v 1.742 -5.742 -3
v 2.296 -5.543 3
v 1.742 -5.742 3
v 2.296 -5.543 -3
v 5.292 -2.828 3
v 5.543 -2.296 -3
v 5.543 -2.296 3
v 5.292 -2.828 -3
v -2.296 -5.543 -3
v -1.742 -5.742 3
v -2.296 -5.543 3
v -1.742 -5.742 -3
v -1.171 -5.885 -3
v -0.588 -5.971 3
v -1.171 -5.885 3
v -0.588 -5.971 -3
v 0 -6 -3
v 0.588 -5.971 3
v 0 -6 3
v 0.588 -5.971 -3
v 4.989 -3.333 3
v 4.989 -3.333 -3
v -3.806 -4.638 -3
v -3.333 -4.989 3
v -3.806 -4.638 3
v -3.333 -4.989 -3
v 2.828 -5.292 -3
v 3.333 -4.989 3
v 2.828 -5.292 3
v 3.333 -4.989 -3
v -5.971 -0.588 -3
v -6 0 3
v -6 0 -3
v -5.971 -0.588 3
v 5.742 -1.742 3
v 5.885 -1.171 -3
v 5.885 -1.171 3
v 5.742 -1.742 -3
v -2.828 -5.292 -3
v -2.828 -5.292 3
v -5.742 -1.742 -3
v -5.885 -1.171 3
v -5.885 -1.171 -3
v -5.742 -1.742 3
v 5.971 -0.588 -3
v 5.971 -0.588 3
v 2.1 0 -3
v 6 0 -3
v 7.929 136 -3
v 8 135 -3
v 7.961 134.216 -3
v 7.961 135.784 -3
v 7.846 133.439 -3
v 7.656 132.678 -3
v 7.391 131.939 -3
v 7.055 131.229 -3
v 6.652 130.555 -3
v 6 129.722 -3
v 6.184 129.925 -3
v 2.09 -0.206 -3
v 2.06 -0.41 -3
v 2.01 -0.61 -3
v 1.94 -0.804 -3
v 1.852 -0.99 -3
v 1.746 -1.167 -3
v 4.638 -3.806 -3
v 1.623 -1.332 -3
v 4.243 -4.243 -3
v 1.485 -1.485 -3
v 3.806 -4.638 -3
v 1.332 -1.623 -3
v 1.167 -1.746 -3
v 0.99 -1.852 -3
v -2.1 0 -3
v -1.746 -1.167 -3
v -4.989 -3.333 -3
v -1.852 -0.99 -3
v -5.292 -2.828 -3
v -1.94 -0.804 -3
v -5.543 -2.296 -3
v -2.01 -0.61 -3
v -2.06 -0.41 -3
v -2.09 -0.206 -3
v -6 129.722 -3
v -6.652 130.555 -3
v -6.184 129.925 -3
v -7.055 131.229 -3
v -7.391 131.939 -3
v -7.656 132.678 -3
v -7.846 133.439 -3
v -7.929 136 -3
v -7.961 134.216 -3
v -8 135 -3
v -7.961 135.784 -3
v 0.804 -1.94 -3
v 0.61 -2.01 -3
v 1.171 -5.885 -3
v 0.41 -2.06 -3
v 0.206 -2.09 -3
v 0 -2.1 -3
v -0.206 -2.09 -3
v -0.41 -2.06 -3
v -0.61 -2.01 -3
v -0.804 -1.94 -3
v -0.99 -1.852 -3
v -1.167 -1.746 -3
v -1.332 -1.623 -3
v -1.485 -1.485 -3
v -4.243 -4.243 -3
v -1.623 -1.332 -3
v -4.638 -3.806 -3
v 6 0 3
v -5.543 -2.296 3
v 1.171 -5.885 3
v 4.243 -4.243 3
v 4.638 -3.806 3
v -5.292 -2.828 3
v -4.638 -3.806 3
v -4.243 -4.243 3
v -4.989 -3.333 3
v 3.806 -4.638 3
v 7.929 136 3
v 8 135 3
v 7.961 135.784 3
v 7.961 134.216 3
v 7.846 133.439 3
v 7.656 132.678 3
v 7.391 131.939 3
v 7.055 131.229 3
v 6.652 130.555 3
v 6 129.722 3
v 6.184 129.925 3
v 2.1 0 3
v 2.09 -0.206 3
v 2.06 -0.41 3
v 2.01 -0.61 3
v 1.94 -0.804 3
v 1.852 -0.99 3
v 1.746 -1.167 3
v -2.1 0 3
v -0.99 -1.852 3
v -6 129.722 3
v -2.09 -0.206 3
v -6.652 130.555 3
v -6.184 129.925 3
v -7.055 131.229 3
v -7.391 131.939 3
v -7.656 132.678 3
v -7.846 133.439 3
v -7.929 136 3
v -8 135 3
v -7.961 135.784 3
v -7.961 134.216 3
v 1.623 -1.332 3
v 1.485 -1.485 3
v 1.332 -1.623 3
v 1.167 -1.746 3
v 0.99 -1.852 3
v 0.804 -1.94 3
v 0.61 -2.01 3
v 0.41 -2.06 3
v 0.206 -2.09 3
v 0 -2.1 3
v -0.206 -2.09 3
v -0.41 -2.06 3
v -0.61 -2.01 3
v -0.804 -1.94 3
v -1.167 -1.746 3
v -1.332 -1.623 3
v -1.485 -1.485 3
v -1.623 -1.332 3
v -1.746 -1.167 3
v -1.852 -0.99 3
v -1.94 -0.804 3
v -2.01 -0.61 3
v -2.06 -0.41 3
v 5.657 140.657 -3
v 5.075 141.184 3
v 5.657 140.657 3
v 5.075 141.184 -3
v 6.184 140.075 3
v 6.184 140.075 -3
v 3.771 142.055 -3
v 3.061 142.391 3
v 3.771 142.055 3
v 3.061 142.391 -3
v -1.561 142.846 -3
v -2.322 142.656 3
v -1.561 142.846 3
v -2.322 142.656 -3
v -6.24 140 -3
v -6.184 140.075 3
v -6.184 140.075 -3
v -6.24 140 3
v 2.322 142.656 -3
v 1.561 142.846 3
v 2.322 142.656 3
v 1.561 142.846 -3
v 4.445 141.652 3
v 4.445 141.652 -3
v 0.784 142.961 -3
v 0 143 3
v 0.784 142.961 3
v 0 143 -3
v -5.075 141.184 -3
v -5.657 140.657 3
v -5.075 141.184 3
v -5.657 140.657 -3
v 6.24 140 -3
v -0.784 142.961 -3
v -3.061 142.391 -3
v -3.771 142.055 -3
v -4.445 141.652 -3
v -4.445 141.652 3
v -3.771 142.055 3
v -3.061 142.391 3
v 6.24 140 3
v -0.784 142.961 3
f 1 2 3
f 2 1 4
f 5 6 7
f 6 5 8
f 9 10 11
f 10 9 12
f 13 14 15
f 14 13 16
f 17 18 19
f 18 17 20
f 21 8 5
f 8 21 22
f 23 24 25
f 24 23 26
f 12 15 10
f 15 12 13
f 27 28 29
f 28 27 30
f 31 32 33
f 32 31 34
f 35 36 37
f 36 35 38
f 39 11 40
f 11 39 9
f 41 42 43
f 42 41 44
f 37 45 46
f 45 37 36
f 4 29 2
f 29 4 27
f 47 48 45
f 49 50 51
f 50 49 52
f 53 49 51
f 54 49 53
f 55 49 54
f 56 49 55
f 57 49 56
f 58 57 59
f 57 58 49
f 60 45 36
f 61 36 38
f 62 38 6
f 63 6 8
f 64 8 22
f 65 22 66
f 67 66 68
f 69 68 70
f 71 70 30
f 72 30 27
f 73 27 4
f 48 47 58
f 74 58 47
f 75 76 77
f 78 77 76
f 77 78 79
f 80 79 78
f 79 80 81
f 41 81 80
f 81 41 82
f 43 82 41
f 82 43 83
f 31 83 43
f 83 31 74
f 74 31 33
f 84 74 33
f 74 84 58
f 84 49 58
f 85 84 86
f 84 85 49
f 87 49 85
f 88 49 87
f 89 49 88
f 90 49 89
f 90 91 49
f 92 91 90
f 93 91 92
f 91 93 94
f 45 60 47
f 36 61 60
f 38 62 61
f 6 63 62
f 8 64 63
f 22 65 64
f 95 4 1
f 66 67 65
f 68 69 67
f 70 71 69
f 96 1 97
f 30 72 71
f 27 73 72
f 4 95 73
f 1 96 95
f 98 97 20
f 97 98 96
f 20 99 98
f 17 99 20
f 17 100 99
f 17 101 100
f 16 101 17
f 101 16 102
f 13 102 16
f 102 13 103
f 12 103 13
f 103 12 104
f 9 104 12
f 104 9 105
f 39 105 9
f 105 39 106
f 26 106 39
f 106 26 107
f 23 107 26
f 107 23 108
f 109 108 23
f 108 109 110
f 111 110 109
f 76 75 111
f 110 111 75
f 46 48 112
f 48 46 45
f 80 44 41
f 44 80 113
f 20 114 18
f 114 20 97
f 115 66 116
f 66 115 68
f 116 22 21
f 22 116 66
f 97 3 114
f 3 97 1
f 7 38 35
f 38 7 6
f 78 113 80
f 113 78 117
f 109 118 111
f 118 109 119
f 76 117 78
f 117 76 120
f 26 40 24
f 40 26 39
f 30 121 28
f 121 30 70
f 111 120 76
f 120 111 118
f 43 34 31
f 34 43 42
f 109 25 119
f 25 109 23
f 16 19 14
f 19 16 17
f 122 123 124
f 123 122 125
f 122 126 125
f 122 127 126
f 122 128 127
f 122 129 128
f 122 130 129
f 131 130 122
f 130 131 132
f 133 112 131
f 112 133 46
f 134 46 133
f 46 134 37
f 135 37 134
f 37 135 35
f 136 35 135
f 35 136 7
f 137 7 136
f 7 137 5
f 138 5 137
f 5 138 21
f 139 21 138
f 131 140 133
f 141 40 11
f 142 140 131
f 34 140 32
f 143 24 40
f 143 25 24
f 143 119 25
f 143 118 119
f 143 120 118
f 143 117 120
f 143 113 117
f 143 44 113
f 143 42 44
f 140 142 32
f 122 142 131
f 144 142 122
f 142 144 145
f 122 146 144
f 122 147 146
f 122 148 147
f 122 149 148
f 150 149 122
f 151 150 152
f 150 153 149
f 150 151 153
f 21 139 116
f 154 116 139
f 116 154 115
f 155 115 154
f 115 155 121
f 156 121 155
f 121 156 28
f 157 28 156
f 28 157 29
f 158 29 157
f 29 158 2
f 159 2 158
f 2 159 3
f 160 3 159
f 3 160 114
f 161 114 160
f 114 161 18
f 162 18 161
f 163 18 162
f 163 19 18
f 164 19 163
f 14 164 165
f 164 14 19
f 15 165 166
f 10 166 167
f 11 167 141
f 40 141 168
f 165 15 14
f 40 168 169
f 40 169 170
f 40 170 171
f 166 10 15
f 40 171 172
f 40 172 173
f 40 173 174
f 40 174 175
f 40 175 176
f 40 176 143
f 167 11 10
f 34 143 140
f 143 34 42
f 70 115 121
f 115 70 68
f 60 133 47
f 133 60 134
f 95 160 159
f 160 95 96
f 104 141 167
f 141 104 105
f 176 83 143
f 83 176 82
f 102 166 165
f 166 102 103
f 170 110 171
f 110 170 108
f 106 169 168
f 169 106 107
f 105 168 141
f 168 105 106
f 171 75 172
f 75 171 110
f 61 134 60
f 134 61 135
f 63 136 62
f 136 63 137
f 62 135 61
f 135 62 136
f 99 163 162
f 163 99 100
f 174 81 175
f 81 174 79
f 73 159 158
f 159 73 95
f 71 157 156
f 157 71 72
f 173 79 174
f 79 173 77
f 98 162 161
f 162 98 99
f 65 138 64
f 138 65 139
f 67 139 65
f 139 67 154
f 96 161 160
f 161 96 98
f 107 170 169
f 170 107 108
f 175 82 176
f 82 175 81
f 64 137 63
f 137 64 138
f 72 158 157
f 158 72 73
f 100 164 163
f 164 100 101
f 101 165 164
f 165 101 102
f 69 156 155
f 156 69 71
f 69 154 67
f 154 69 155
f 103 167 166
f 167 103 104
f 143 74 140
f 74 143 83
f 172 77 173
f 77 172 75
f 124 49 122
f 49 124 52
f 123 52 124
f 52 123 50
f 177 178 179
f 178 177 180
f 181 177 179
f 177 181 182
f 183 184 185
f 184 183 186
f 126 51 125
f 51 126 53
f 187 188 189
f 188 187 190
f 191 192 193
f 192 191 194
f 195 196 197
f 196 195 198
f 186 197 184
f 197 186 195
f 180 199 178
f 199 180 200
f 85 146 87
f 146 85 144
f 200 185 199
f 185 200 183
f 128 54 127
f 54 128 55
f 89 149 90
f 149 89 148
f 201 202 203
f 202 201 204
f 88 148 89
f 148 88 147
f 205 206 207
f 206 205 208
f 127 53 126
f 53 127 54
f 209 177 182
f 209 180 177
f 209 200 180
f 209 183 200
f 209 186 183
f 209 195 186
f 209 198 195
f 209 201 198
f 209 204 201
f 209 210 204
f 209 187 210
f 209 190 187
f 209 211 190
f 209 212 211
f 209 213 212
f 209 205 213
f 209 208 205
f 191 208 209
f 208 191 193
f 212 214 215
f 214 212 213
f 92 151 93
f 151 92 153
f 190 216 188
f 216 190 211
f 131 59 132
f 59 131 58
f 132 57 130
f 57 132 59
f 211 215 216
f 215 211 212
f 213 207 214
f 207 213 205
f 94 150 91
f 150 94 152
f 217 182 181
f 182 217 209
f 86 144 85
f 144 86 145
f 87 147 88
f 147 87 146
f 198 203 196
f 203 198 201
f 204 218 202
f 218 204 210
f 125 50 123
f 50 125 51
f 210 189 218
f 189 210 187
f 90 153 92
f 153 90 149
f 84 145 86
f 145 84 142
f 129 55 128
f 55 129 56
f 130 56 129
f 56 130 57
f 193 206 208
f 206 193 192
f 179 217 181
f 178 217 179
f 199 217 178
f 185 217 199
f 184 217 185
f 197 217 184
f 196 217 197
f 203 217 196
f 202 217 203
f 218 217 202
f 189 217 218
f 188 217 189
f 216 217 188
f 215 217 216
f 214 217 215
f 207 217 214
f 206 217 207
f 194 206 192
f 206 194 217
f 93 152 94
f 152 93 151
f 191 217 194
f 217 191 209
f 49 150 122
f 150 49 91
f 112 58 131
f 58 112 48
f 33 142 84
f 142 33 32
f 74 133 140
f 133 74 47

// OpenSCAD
// file: ../modules/hinge.scad
// ====================================================================
// Integrated 3D Printable Hinge Module
// Pin-and-barrel knuckle hinge for French doors and top roof doors
// ====================================================================
include <../config.scad>

// Female Hinge Knuckle (mounted to frame pillar)
module hinge_female_knuckle(
    barrel_od = 10.0,
    pin_id = 5.0,
    height = 28.0,
    center_gap = 12.0
) {
    difference() {
        cylinder(d = barrel_od, h = height, center = true);
        
        // Center cutout for male knuckle
        cube([barrel_od + 2, barrel_od + 2, center_gap + 2*TOL_HINGE], center = true);
        
        // Through-hole for hinge pin
        cylinder(d = pin_id + TOL_HINGE, h = height + 4, center = true);
    }
}

// Male Hinge Knuckle (mounted to door frame)
module hinge_male_knuckle(
    barrel_od = 10.0,
    pin_id = 5.0,
    knuckle_h = 11.5
) {
    difference() {
        cylinder(d = barrel_od - 0.2, h = knuckle_h, center = true);
        
        // Through-hole for hinge pin
        cylinder(d = pin_id + TOL_HINGE, h = knuckle_h + 2, center = true);
    }
}

// Dedicated 3D Printable Hinge Pin with Retention Head
module hinge_pin(
    pin_id = 5.0,
    length = 32.0
) {
    union() {
        // Main pin shaft
        cylinder(d = pin_id - TOL_HINGE, h = length, center = true);
        
        // Chamfered tip for easy alignment insertion
        translate([0, 0, length/2])
        cylinder(r1 = (pin_id - TOL_HINGE)/2, r2 = (pin_id - TOL_HINGE)/2 - 0.8, h = 2, center = false);
        
        // Retention cap
        translate([0, 0, -length/2 - 2])
        cylinder(d = pin_id + 4, h = 2.5, center = false);
    }
}
// file: ../modules/spline_profile.scad
// ====================================================================
// Cellophane Spline Groove & Snap-in Locking Strip Module
// Retention mechanism to hold packaging plastic taut without screws
// ====================================================================
include <../config.scad>

// Negative volume for cutting the spline groove into any beam surface
// Oriented along X axis, cut into -Z face
module spline_groove_negative(length = 100) {
    translate([0, 0, -GROOVE_DEPTH / 2])
    union() {
        // Main channel
        cube([length, GROOVE_WIDTH, GROOVE_DEPTH], center = true);
        
        // Retention undercuts / wedge lip at depth
        translate([0, 0, -GROOVE_DEPTH / 4])
        cube([length, GROOVE_WIDTH + 0.6, GROOVE_DEPTH / 2], center = true);
    }
}

// 2D Profile of the snap-in locking spline clip
module spline_clip_profile_2d() {
    w = SPLINE_WIDTH;
    h = SPLINE_HEIGHT;
    union() {
        // Chamfered lead-in nose
        polygon(points=[
            [-w/2 + 0.8, 0],
            [ w/2 - 0.8, 0],
            [ w/2, 1.0],
            [ w/2, h - 1.0],
            [ w/2 + 0.5, h], // Outer retention lip
            [-w/2 - 0.5, h], // Outer retention lip
            [-w/2, h - 1.0],
            [-w/2, 1.0]
        ]);
        
        // Gripping top ridge for thumb pressing and removal
        translate([0, h + 1.0])
        circle(r = 1.6);
    }
}

// 3D Snap-in Locking Spline Clip (cut to specified length)
module spline_clip(length = 150) {
    rotate([0, 90, 0])
    linear_extrude(height = length, center = true) {
        spline_clip_profile_2d();
    }
}
// file: ../modules/dovetail.scad
// ====================================================================
// Dovetail Interlock & Tapered Locking Pin Module
// Hardware-free rigid joint system for modular 3D printed beams
// ====================================================================
include <../config.scad>

// 2D Profile of Tapered Dovetail (centered at origin, extending in +Y direction)
module dovetail_profile_2d(base_w, tip_w, depth, offset_val=0) {
    w1 = (base_w / 2) + offset_val;
    w2 = (tip_w / 2) + offset_val;
    polygon(points=[
        [-w2, 0],
        [-w1, depth],
        [ w1, depth],
        [ w2, 0]
    ]);
}

// 3D Male Dovetail Tenon (extruded along Z, projects in +X or +Z depending on usage)
module male_dovetail(
    w = BEAM_WIDTH,
    h = BEAM_HEIGHT,
    depth = DOVETAIL_DEPTH,
    tol = 0
) {
    difference() {
        translate([0, -depth, 0])
        rotate([0, 0, 90])
        linear_extrude(height = h - 2*tol, center = true) {
            dovetail_profile_2d(
                base_w = DOVETAIL_BASE_W - 2*tol,
                tip_w  = DOVETAIL_TIP_W  - 2*tol,
                depth  = depth
            );
        }
        
        // Transverse locking pin hole (tapered)
        translate([0, -depth/2, 0])
        rotate([90, 0, 0])
        cylinder(
            r1 = (PIN_HOLE_DIA / 2) - 0.2,
            r2 = (PIN_HOLE_DIA / 2) + 0.2,
            h  = w + 10,
            center = true
        );
    }
}

// 3D Female Dovetail Pocket (cut into beam end)
module female_dovetail_pocket(
    w = BEAM_WIDTH,
    h = BEAM_HEIGHT,
    depth = DOVETAIL_DEPTH,
    tol = TOL_DOVETAIL
) {
    union() {
        translate([0, -0.01, 0])
        rotate([0, 0, 90])
        linear_extrude(height = h + 2*tol, center = true) {
            dovetail_profile_2d(
                base_w = DOVETAIL_BASE_W + 2*tol,
                tip_w  = DOVETAIL_TIP_W  + 2*tol,
                depth  = depth + 0.5
            );
        }
        
        // Transverse locking pin hole through the surrounding walls
        translate([0, depth/2, 0])
        rotate([90, 0, 0])
        cylinder(
            r1 = (PIN_HOLE_DIA / 2) - 0.2,
            r2 = (PIN_HOLE_DIA / 2) + 0.2,
            h  = w + 10,
            center = true
        );
    }
}

// Tapered Locking Wedge Pin
module locking_taper_pin(
    pin_len = BEAM_WIDTH + 6,
    dia = PIN_HOLE_DIA,
    taper = PIN_TAPER_ANGLE
) {
    r_mid = dia / 2 - TOL_DOVETAIL;
    delta_r = (pin_len / 2) * tan(taper / 2);
    r1 = r_mid - delta_r;
    r2 = r_mid + delta_r;
    
    union() {
        // Tapered locking shaft
        cylinder(r1 = r1, r2 = r2, h = pin_len, center = true);
        
        // Ergonomic pull-tab head for tool-free insertion & removal
        translate([0, 0, pin_len / 2])
        hull() {
            cylinder(r = r2 + 2.5, h = 3.5, center = false);
            translate([0, 0, 5])
            cube([2.5, (r2 + 2.5)*2, 0.1], center = true);
        }
    }
}
// file: ../config.scad
// ====================================================================
// Bambu Lab A1 Enclosure - Global Configuration Parameters
// 100% 3D Printable, Hardware-Free Modular Enclosure
// ====================================================================

// --- Print Bed Limits ---
MAX_PRINT_X = 256;
MAX_PRINT_Y = 256;
MAX_PRINT_Z = 256;
SAFE_PART_MAX_LEN = 240; // Safety margin for brim and skirt

// --- Internal Enclosure Dimensions (mm) ---
// Sized for Bambu Lab A1 bed-slinger travel, right poop bucket, and top BMCU 370c
INTERNAL_WIDTH  = 560; // X axis clearance (A1 + toolhead + right poop bucket)
INTERNAL_DEPTH  = 580; // Y axis clearance (Bed travel + rear cable loop buffer)
INTERNAL_HEIGHT = 710; // Z axis clearance (Gantry + BMCU 370c rotating mount + spool)

// --- Frame Profile Dimensions ---
BEAM_WIDTH  = 24;  // Beam thickness X/Y (mm)
BEAM_HEIGHT = 24;  // Beam thickness Z (mm)
WALL_THICKNESS = 3.2; // Shell thickness for robust frame rigidity

// Outer Dimensions
OUTER_WIDTH  = INTERNAL_WIDTH  + 2 * BEAM_WIDTH;  // ~608 mm
OUTER_DEPTH  = INTERNAL_DEPTH  + 2 * BEAM_WIDTH;  // ~628 mm
OUTER_HEIGHT = INTERNAL_HEIGHT + 2 * BEAM_HEIGHT; // ~758 mm

// --- Tolerances (FDM 3D Printing tuned for Bambu Lab A1 0.4mm nozzle) ---
TOL_TIGHT    = 0.15; // Tight press fit (spline clips)
TOL_DOVETAIL = 0.20; // Sliding interlock fit (dovetails & taper pins)
TOL_HINGE    = 0.30; // Free rotating hinge pins
TOL_LOOSE    = 0.40; // Clearance gaps

// --- Cellophane Spline Groove Specifications ---
GROOVE_WIDTH  = 4.5; // Width of U-channel on outer beam faces
GROOVE_DEPTH  = 5.0; // Depth of U-channel
SPLINE_WIDTH  = 4.2; // Width of snap-in locking spline strip
SPLINE_HEIGHT = 4.8; // Height of locking spline strip
SPLINE_LIP_R  = 0.6; // Small retention bead radius to pinch cellophane

// --- Tapered Dovetail & Pin Specifications ---
DOVETAIL_DEPTH  = 16.0; // Length of dovetail insert (mm)
DOVETAIL_BASE_W = 14.0; // Width at base of male dovetail
DOVETAIL_TIP_W  = 8.0;  // Width at narrowest point of taper
PIN_HOLE_DIA    = 6.0;  // Transverse locking pin hole diameter (tapered)
PIN_TAPER_ANGLE = 4.0;  // Degrees taper on locking pin for wedge action

// --- Segmentation Calculations (All segments < SAFE_PART_MAX_LEN) ---
CORNER_BLOCK_SIZE = 36; // 3-way cubic corner junction dimension

// Beam span between corners:
SPAN_X = INTERNAL_WIDTH  + 2 * BEAM_WIDTH - 2 * CORNER_BLOCK_SIZE;  // 608 - 72 = 536 mm
SPAN_Y = INTERNAL_DEPTH  + 2 * BEAM_WIDTH - 2 * CORNER_BLOCK_SIZE;  // 628 - 72 = 556 mm
SPAN_Z = INTERNAL_HEIGHT + 2 * BEAM_HEIGHT - 2 * CORNER_BLOCK_SIZE; // 758 - 72 = 686 mm

// Number of segments per span:
NUM_SEGS_X = 3; // 536 / 3 = 178.67 mm per segment
NUM_SEGS_Y = 3; // 556 / 3 = 185.33 mm per segment
NUM_SEGS_Z = 3; // 686 / 3 = 228.67 mm per segment

SEG_LEN_X = SPAN_X / NUM_SEGS_X;
SEG_LEN_Y = SPAN_Y / NUM_SEGS_Y;
SEG_LEN_Z = SPAN_Z / NUM_SEGS_Z;

// --- Filament PTFE Tube Routing (Bottom Side Beam) ---
PTFE_TUBE_OD  = 4.0; // Standard PTFE bowden tube outer diameter (mm)
PTFE_HOLE_DIA = 4.3; // Slip-fit through-hole diameter with retention grip
PTFE_TUBE_CNT = 4;   // 4 dedicated filament tubes for multi-material / drybox
PTFE_ANGLE    = 35;  // Upward angle toward toolhead/BMCU (degrees)

// --- Render Quality ($fn) ---
$fn = $preview ? 24 : 64;
// main file
// ====================================================================
// Dual Top Roof Doors with Integrated Heat Dissipation Prop Legs
// Opens upward to vent heat during PLA/PETG printing or close for draft protection
// Fully modular and printable on Bambu Lab A1
// ====================================================================
include <../config.scad>
use <../modules/dovetail.scad>
use <../modules/spline_profile.scad>
use <../modules/hinge.scad>

ROOF_DOOR_WIDTH = (INTERNAL_WIDTH / 2) - 4.0; // ~276 mm per door leaf
ROOF_DOOR_DEPTH = INTERNAL_DEPTH - 6.0;        // ~574 mm total depth
ROOF_FRAME_W = 16.0;
ROOF_FRAME_H = 16.0;

// 1. Roof Door Depth Stile Segment (Hinged to the top side frame beam)
// Depth split into 3 segments (~190 mm each)
module roof_stile_segment(length = ROOF_DOOR_DEPTH / 3, is_hinge = false) {
    difference() {
        union() {
            cube([ROOF_FRAME_W, length, ROOF_FRAME_H], center = true);
            
            // Integrated Male Hinge Knuckle on outer edge
            if (is_hinge) {
                translate([-ROOF_FRAME_W/2 - 4.5, 0, 0])
                rotate([90, 0, 0])
                hinge_male_knuckle();
            }
        }
        
        // Spline groove for top cellophane panel facing inward (+X)
        translate([ROOF_FRAME_W/2, 0, 0])
        rotate([90, 0, 0])
        spline_groove_negative(length = length + 2);
        
        // Female joint at -Y end
        translate([0, -length/2, 0])
        rotate([0, 0, 90])
        female_dovetail_pocket(w = ROOF_FRAME_W, h = ROOF_FRAME_H, depth = 12);
    }
    
    // Male joint at +Y end
    translate([0, length/2, 0])
    rotate([0, 0, -90])
    male_dovetail(w = ROOF_FRAME_W, h = ROOF_FRAME_H, depth = 12);
}

// 2. Center Meeting Stile Segment with Prop-Leg Pivot & Detent Socket
module roof_center_stile(length = ROOF_DOOR_DEPTH / 3) {
    difference() {
        cube([ROOF_FRAME_W, length, ROOF_FRAME_H], center = true);
        
        // Spline groove facing inward (-X)
        translate([-ROOF_FRAME_W/2, 0, 0])
        rotate([90, 0, 0])
        spline_groove_negative(length = length + 2);
        
        // Female joint at -Y end
        translate([0, -length/2, 0])
        rotate([0, 0, 90])
        female_dovetail_pocket(w = ROOF_FRAME_W, h = ROOF_FRAME_H, depth = 12);
        
        // Pivot socket for prop leg
        translate([0, 0, -ROOF_FRAME_H/2 + 3])
        rotate([0, 90, 0])
        cylinder(d = 4.5, h = ROOF_FRAME_W + 2, center = true);
    }
    
    // Male joint at +Y end
    translate([0, length/2, 0])
    rotate([0, 0, -90])
    male_dovetail(w = ROOF_FRAME_W, h = ROOF_FRAME_H, depth = 12);
}

// 3. Integrated Multi-Angle Prop Leg (Kickstand)
// Folds flat into the door frame when closed, props open at 30 deg, 60 deg, or 90 deg
module roof_prop_leg(length = 135) {
    leg_w = 12.0;
    leg_t = 6.0;
    
    union() {
        // Pivot head with detent cam
        difference() {
            cylinder(d = leg_w, h = leg_t, center = true);
            cylinder(d = 4.2, h = leg_t + 2, center = true); // Pivot pin hole
            
            // Angular detent notches (30 deg, 60 deg)
            for (ang = [30, 60]) {
                rotate([0, 0, ang])
                translate([leg_w/2, 0, 0])
                sphere(r = 1.2);
            }
        }
        
        // Strut body
        translate([0, length/2, 0])
        cube([leg_w, length, leg_t], center = true);
        
        // Non-slip foot with resting notch
        translate([0, length, 0])
        difference() {
            cylinder(d = leg_w + 4, h = leg_t, center = true);
            translate([0, 3, 0])
            cube([leg_w + 6, 4, leg_t + 2], center = true);
        }
    }
}

// Preview prop leg
roof_prop_leg();
